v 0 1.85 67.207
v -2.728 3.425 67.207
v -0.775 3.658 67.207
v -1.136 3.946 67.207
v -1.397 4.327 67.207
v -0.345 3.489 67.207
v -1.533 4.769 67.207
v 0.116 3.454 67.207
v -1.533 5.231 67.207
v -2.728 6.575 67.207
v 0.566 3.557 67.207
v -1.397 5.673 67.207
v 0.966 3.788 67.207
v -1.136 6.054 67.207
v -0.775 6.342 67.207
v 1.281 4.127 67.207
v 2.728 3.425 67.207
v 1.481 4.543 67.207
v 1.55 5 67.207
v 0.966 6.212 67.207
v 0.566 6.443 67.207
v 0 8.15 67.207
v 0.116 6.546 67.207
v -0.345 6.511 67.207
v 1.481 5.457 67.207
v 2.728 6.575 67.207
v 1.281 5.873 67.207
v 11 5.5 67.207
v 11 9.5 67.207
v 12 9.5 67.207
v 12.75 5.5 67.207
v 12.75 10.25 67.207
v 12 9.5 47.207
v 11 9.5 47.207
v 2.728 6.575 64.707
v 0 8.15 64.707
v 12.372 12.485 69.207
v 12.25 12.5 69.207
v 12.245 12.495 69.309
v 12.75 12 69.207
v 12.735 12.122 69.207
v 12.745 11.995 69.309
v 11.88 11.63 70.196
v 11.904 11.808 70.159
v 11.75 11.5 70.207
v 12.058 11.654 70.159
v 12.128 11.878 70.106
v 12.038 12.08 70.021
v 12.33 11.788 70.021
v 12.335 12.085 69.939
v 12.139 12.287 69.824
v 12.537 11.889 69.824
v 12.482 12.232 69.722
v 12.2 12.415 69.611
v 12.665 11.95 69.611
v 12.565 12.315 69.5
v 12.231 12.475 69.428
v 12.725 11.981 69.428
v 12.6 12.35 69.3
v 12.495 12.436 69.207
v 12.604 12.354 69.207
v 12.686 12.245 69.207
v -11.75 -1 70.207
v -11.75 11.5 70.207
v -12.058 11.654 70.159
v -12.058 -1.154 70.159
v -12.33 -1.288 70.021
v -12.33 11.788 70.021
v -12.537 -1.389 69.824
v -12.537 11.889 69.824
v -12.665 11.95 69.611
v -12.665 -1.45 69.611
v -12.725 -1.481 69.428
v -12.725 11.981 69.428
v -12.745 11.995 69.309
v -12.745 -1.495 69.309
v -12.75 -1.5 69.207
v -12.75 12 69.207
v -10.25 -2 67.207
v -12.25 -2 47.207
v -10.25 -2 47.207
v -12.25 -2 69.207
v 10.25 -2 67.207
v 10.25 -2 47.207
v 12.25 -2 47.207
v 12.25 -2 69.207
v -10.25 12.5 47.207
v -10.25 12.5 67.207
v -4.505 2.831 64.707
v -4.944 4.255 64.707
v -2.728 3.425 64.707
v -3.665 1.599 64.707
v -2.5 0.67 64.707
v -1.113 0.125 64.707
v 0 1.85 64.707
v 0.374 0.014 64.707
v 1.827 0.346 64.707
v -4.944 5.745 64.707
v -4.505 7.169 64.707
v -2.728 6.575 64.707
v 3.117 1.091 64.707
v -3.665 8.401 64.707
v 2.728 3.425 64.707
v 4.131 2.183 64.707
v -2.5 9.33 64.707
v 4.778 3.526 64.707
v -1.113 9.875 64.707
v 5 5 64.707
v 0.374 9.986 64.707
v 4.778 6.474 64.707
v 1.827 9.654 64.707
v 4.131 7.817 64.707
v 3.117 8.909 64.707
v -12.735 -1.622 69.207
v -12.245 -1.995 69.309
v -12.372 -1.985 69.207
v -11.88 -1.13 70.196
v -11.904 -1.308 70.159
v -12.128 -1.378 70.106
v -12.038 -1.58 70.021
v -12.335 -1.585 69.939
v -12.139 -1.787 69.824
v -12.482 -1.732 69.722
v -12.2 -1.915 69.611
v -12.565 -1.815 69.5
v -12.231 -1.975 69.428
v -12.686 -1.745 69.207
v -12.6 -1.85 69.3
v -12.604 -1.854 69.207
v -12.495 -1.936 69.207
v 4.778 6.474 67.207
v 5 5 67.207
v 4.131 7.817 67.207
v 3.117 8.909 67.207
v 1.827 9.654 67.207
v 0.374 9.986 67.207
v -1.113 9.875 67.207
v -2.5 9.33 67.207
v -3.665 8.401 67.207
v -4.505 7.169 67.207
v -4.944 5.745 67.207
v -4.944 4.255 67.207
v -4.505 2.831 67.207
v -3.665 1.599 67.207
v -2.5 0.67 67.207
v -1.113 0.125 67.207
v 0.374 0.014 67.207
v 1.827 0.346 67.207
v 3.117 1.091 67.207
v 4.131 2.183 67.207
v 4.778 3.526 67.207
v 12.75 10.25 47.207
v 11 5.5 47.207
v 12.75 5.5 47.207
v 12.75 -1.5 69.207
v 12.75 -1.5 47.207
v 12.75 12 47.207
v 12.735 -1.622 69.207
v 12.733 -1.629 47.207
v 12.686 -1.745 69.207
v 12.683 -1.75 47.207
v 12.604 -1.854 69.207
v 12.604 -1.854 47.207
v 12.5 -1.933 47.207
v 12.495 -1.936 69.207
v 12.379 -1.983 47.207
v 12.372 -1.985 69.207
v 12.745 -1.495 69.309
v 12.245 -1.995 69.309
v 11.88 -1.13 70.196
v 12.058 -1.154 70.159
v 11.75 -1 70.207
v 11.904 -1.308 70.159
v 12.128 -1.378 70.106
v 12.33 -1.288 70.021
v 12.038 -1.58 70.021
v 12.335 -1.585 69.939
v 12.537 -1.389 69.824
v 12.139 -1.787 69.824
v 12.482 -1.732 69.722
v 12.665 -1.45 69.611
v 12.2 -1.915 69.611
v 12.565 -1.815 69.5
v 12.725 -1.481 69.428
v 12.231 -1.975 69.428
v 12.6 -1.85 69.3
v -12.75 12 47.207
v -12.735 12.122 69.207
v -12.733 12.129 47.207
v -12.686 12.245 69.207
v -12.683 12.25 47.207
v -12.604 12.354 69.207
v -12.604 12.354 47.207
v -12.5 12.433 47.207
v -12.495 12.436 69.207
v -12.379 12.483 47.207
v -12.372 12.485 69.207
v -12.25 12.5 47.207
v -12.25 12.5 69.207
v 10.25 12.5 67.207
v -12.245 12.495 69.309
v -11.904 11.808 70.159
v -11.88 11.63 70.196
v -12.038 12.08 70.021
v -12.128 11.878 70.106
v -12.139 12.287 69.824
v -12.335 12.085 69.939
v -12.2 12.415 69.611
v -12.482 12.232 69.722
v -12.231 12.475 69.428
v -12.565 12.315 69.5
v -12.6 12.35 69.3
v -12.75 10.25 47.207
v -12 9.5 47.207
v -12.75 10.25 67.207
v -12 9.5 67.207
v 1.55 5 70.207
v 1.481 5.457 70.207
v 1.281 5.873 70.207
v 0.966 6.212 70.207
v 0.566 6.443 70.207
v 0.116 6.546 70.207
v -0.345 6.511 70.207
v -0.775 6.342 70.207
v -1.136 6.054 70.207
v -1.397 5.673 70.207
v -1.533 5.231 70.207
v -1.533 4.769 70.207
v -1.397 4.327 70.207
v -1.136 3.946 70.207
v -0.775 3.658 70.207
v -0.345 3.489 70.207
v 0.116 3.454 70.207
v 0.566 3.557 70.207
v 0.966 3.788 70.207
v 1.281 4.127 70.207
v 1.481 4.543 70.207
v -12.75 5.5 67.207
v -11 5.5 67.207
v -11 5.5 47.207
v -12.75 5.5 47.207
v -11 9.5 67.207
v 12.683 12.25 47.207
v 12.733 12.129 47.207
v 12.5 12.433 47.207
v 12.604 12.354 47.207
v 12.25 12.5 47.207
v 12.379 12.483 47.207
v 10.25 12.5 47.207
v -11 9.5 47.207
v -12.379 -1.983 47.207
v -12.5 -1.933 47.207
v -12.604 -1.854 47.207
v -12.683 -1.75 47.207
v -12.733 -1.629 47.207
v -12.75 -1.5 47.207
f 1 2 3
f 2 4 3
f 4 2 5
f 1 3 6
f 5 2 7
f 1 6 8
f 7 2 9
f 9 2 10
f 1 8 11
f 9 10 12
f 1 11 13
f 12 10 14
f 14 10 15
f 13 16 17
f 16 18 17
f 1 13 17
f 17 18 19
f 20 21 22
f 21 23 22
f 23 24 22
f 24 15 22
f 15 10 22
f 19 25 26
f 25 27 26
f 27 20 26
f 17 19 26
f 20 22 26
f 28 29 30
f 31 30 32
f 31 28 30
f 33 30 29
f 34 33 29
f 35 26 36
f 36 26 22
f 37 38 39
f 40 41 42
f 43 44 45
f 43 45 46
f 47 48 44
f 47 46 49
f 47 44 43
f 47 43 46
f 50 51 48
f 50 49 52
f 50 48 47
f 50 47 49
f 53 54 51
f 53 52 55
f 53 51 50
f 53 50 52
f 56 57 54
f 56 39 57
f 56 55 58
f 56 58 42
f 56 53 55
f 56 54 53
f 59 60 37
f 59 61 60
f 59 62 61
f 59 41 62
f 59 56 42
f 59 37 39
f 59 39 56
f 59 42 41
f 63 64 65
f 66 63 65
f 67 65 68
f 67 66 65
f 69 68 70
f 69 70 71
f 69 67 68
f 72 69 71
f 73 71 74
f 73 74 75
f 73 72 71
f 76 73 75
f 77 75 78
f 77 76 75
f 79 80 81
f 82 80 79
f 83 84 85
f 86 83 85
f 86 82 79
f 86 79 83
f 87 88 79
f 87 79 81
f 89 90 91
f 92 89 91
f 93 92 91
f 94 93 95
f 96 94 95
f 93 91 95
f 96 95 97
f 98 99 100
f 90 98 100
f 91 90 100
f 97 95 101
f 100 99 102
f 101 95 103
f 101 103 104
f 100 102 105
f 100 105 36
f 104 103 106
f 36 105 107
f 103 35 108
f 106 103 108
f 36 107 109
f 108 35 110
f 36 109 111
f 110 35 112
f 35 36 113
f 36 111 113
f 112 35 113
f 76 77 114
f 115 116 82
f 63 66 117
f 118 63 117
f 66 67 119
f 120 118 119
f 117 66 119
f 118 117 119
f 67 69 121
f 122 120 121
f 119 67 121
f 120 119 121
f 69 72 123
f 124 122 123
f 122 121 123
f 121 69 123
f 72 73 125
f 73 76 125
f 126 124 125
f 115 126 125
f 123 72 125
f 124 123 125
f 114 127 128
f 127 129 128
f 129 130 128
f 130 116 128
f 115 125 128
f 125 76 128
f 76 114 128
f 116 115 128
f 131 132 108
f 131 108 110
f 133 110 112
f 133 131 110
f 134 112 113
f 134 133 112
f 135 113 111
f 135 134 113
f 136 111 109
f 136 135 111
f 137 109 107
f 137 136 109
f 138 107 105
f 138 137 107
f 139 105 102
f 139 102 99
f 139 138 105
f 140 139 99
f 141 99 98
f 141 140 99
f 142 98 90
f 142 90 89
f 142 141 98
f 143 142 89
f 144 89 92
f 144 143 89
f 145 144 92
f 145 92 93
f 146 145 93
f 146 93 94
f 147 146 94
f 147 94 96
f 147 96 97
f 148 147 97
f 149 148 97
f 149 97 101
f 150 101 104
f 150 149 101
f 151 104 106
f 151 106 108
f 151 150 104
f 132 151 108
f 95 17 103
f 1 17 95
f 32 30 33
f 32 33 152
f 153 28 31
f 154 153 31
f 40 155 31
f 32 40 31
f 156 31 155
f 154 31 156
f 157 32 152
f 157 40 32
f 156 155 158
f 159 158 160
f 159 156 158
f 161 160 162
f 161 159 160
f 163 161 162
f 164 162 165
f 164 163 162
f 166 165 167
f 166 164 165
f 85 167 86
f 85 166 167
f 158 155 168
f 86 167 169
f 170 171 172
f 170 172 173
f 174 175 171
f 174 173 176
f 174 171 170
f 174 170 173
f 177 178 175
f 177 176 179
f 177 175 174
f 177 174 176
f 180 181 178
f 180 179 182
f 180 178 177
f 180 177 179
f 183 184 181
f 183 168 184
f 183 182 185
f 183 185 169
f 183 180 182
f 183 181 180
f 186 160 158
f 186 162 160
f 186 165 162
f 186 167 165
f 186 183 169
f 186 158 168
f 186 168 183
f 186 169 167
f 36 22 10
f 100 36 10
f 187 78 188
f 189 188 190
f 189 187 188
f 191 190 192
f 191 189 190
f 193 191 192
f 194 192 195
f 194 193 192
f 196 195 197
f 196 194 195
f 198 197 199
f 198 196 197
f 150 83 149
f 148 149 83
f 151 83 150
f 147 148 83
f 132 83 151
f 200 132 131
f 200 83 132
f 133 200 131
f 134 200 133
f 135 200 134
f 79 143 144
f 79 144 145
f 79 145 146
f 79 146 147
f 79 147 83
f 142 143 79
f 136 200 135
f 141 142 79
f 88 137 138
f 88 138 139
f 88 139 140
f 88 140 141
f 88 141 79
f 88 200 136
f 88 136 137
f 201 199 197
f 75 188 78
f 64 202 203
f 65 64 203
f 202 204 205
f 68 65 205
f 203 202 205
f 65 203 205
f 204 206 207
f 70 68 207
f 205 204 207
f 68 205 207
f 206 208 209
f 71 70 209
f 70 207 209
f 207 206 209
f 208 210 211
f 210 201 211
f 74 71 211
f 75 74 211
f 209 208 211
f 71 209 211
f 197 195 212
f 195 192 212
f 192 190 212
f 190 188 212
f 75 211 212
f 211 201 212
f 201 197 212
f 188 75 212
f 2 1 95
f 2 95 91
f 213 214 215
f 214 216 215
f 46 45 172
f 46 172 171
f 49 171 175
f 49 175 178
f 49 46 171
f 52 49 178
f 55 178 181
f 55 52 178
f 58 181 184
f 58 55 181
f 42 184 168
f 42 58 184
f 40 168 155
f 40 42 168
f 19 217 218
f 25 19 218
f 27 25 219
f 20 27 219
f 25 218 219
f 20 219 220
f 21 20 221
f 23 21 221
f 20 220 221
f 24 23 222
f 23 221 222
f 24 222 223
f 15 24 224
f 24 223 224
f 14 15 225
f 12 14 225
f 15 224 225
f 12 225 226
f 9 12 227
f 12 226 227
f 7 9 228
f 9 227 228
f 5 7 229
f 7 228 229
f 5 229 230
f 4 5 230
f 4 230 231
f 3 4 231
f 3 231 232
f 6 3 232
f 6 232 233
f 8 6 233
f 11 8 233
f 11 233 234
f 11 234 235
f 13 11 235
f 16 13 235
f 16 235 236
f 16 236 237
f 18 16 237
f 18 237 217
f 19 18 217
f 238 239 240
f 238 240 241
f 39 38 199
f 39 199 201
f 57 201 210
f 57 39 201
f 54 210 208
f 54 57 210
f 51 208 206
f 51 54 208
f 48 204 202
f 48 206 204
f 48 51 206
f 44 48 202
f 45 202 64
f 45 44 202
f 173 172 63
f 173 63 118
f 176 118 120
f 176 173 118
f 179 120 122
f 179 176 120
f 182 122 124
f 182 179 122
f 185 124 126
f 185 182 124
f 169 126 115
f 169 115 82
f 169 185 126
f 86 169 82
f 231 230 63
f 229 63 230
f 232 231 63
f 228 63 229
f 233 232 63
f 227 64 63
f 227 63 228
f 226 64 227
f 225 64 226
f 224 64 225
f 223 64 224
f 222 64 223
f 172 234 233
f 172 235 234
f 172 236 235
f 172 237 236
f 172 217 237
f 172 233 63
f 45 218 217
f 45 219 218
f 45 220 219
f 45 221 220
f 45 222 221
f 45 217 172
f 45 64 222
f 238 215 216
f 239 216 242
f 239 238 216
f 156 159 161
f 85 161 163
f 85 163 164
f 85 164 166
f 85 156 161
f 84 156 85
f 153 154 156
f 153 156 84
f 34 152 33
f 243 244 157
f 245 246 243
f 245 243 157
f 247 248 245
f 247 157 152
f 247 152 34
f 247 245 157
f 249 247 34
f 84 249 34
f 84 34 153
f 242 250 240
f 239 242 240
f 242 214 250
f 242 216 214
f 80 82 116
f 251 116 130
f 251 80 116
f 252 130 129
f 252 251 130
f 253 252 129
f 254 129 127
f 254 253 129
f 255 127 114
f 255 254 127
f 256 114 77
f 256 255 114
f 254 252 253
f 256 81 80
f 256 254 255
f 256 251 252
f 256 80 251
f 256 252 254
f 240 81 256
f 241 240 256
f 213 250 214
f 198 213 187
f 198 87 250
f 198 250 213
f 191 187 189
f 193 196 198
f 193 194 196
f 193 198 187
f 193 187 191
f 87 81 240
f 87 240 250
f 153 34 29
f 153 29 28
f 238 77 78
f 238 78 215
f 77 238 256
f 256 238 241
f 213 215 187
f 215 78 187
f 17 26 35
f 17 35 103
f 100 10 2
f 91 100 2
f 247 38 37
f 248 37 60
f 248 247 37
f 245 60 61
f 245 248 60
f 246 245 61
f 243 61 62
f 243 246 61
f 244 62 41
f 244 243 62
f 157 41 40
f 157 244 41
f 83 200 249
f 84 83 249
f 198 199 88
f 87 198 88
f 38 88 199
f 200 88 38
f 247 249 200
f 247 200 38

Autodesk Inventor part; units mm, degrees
ref_plane "YZ Plane" through (0, 0, 0) normal (1, 0, 0) x (0, 1, 0)
ref_plane "XZ Plane" through (0, 0, 0) normal (0, 1, 0) x (-1, 0, 0)
ref_plane "XY Plane" through (0, 0, 0) normal (0, 0, 1) x (1, 0, 0)
sketch "Эскиз1" plane through (0, 0, 0) normal (0, 1, 0) x (-1, 0, 0)
  line L0 (0, 56.6418) -> (23.7825, 76.5969) construction
  line L1 (44.1942, 76.014) -> (76.014, 44.1942) construction
  line L2 (91.1, 52.2091) -> (52.2091, 91.1) construction
  line L3 (0, 0) -> (74.2462, 74.2462) construction
  arc A0 (92.5543, 49.5852) -> (48.7014, 93.0224) centre (0, 0) ccw construction
  line L4 (52.2091, 91.1) -> (48.6736, 87.5645) construction
  arc A1 (44.1942, 83.085) -> (44.1942, 76.014) centre (47.7297, 79.5495) ccw construction
  line L5 (52.2091, 91.1) -> (48.6736, 87.5645) construction
  line L6 (48.6736, 87.5645) -> (52.2091, 91.1) construction
  spline S0 degree 2 poles (48.6736, 87.5645) (52.2091, 91.1) (48.7014, 93.0224) knots 1 1 1 2 2 2 construction
  line L7 (52.2091, 91.1) -> (48.7014, 93.0224) construction
  line L8 (52.2091, 91.1) -> (48.7014, 93.0224) construction
  arc A2 (48.7014, 93.0224) -> (44.0271, 95.3237) centre (0, 0) ccw construction
  arc A3 (44.0271, 95.3237) -> (43.577, 95.5303) centre (0, 0) ccw construction
  line L9 (42.6652, 95.941) -> (43.577, 95.5303) construction
  line L10 (42.6652, 95.941) -> (43.577, 95.5303) construction
  spline S1 degree 2 poles (42.0492, 94.5734) (42.6652, 95.941) (43.577, 95.5303) knots 1 1 1 2 2 2 construction
  line L11 (42.0492, 94.5734) -> (42.6652, 95.941) construction
  line L12 (42.6652, 95.941) -> (42.0492, 94.5734) construction
  line L13 (0, 0) -> (0, 209.8821) construction
  spline S2 degree 2 poles (-48.6736, 87.5645) (-52.2091, 91.1) (-48.7014, 93.0224) knots 1 1 1 2 2 2 construction
  line L14 (-48.6736, 87.5645) -> (-52.2091, 91.1) construction
  line L15 (-52.2091, 91.1) -> (-48.7014, 93.0224) construction
  arc A4 (-44.1942, 76.014) -> (-44.1942, 83.085) centre (-47.7297, 79.5495) ccw construction
  line L16 (-44.1942, 76.014) -> (-76.014, 44.1942) construction
  arc A5 (-48.7014, 93.0224) -> (-92.5543, 49.5852) centre (0, 0) ccw construction
  arc A6 (-83.085, 44.1942) -> (-76.014, 44.1942) centre (-79.5495, 47.7297) ccw construction
  line L17 (-83.085, 44.1942) -> (-87.3563, 48.4654) construction
  spline S3 degree 2 poles (-48.6736, -87.5645) (-52.2091, -91.1) (-48.7014, -93.0224) knots 1 1 1 2 2 2 construction
  line L18 (-48.6736, -87.5645) -> (-52.2091, -91.1) construction
  line L19 (-52.2091, -91.1) -> (-48.7014, -93.0224) construction
  circle A7 centre (0, 0) radius 35 construction
  line L20 (-46.3155, -73.8927) -> (-73.8927, -46.3155) construction
  arc A8 (-73.8927, -46.3155) -> (-85.2064, -46.3155) centre (-79.5495, -51.9723) ccw construction
  line L21 (-85.2064, -46.3155) -> (-87.5645, -48.6736) construction
  line L22 (-87.5645, -48.6736) -> (-91.1, -52.2091) construction
  spline S4 degree 2 poles (-87.5645, -48.6736) (-91.1, -52.2091) (-92.5543, -49.5852) knots 1 1 1 2 2 2 construction
  line L23 (-91.1, -52.2091) -> (-92.5543, -49.5852) construction
  arc A9 (-92.5543, -49.5852) -> (-48.7014, -93.0224) centre (0, 0) ccw construction
  arc A10 (-92.5543, 49.5852) -> (-92.5543, -49.5852) centre (0, 0) ccw construction
  line L24 (48.6736, -87.5645) -> (46.3155, -85.2064) construction
  arc A11 (-46.3155, -85.2064) -> (-46.3155, -73.8927) centre (-51.9723, -79.5495) ccw construction
  line L25 (-48.6736, -87.5645) -> (-46.3155, -85.2064) construction
  arc A12 (-48.7014, -93.0224) -> (48.7014, -93.0224) centre (0, 0) ccw construction
  arc A13 (46.3155, -73.8927) -> (46.3155, -85.2064) centre (51.9723, -79.5495) ccw construction
  arc A14 (43.577, 95.5303) -> (-43.577, 95.5303) centre (0, 0) ccw construction
  arc A15 (23.7825, 76.5969) -> (0, 67.941) centre (0, 104.941) ccw construction
  line L26 (0, 56.6418) -> (-35.5516, 86.4744) construction
  line L27 (44.0271, 95.3237) -> (44.0271, 127.8162) construction
  ellipse E0 centre (0, 102.7511) end of major axis (44.0271, 102.7511) minor radius 27.5932 (42.0492, 94.5734) -> (35.2734, 86.2384) ccw construction
  line L28 (42.6652, 95.941) -> (-42.6652, 95.941) construction
  ellipse E1 centre (0, 102.7511) end of major axis (44.5159, 105.2445) minor radius 28.887 (35.2734, 86.2384) -> (42.0492, 94.5734) ccw construction
  line L29 (23.7825, 76.5969) -> (35.2734, 86.2384) construction
  arc A16 (0, 67.941) -> (23.7825, 76.5969) centre (0, 104.941) ccw construction
  arc A17 (-23.7825, 76.5969) -> (0, 67.941) centre (0, 104.941) ccw construction
  line L30 (-23.7825, 76.5969) -> (-35.2734, 86.2384) construction
  line L31 (-42.6652, 95.941) -> (-42.0492, 94.5734) construction
  arc A18 (-43.577, 95.5303) -> (-48.7014, 93.0224) centre (0, 0) ccw construction
  line L32 (-42.6652, 95.941) -> (-43.577, 95.5303) construction
  spline S5 degree 2 poles (-42.0492, 94.5734) (-42.6652, 95.941) (-43.577, 95.5303) knots 1 1 1 2 2 2 construction
  line L33 (-42.0492, 94.5734) -> (-42.6652, 95.941) construction
  line L34 (-42.6652, 95.941) -> (-43.577, 95.5303) construction
  line L35 (-42.6652, 95.941) -> (-43.577, 95.5303) construction
  spline S6 degree 2 poles (-42.0492, 94.5734) (-42.6652, 95.941) (-43.577, 95.5303) knots 1 1 1 2 2 2 construction
  line L36 (-42.0492, 94.5734) -> (-42.6652, 95.941) construction
  ellipse E2 centre (0, 102.7511) end of major axis (-44.5159, 105.2445) minor radius 28.887 (-42.0492, 94.5734) -> (-35.2734, 86.2384) ccw construction
  line L37 (83.085, 44.1942) -> (87.5645, 48.6736) construction
  arc A19 (76.014, 44.1942) -> (83.085, 44.1942) centre (79.5495, 47.7297) ccw construction
  spline S7 degree 2 poles (48.6736, -87.5645) (52.2091, -91.1) (48.7014, -93.0224) knots 1 1 1 2 2 2 construction
  line L38 (48.6736, -87.5645) -> (52.2091, -91.1) construction
  line L39 (52.2091, -91.1) -> (48.7014, -93.0224) construction
  line L40 (46.3155, -73.8927) -> (73.8927, -46.3155) construction
  arc A20 (85.2064, -46.3155) -> (73.8927, -46.3155) centre (79.5495, -51.9723) ccw construction
  line L41 (85.2064, -46.3155) -> (87.5645, -48.6736) construction
  spline S8 degree 2 poles (87.5645, -48.6736) (91.1, -52.2091) (92.5543, -49.5852) knots 1 1 1 2 2 2 construction
  line L42 (87.5645, -48.6736) -> (91.1, -52.2091) construction
  line L43 (91.1, -52.2091) -> (92.5543, -49.5852) construction
  arc A21 (92.5543, -49.5852) -> (92.5543, 49.5852) centre (0, 0) ccw construction
  arc A22 (48.7014, -93.0224) -> (92.5543, -49.5852) centre (0, 0) ccw construction
  arc A23 (28.5452, 71.4571) -> (-28.5452, 71.4571) centre (0, 104.941) ccw construction
  line L44 (-83.085, 34.2947) -> (-90.6891, 41.8987) construction
  line L45 (-93.5297, 47.6709) -> (-92.5543, 49.5852) construction
  line L46 (-29.1816, 81.127) -> (-76.014, 34.2947) construction
  arc A24 (-83.085, 34.2947) -> (-76.014, 34.2947) centre (-79.5495, 37.8302) ccw construction
  line L47 (-34.1491, 76.1596) -> (-28.5452, 71.4571) construction
  arc A25 (-30.6393, 73.2144) -> (-37.3889, 72.9198) centre (-33.8534, 69.3842) ccw construction
  arc A26 (-90.6891, 41.8987) -> (-87.3563, 48.4654) centre (0, 0) ccw construction
  arc A27 (37.3889, 72.9198) -> (30.6393, 73.2144) centre (33.8534, 69.3842) ccw construction
  line L48 (29.1816, 81.127) -> (76.014, 34.2947) construction
  arc A28 (76.014, 34.2947) -> (83.085, 34.2947) centre (79.5495, 37.8302) ccw construction
  line L49 (83.085, 34.2947) -> (90.6891, 41.8987) construction
  arc A29 (76.014, 44.1942) -> (83.085, 44.1942) centre (79.5495, 47.7297) ccw construction
  line L50 (44.1942, 76.014) -> (76.014, 44.1942) construction
  arc A30 (44.1942, 83.085) -> (44.1942, 76.014) centre (47.7297, 79.5495) ccw construction
  arc A31 (5.5413, 61.2914) -> (28.5452, 71.4571) centre (0, 104.941) ccw
  arc A32 (-28.5452, 71.4571) -> (5.5413, 61.2914) centre (0, 104.941) ccw
  line L51 (34.1491, 76.1596) -> (28.5452, 71.4571) construction
  arc A33 (-87.3563, 48.4654) -> (-90.6891, 41.8987) centre (0, 0) ccw construction
  line L52 (83.085, 44.1942) -> (87.3563, 48.4654) construction
  arc A34 (90.6891, 41.8987) -> (87.3563, 48.4654) centre (0, 0) ccw construction
  line L53 (-44.1942, 83.085) -> (-48.6736, 87.5645) construction
  line L54 (44.0271, 95.3237) -> (43.577, 95.5303) construction
  line L55 (48.6736, 87.5645) -> (44.1942, 83.085) construction
  line L56 (0, 104.941) -> (-23.6028, 54.3247) construction
  circle A35 centre (31.1916, 76.2887) radius 2 construction
  line L57 (29.1816, 81.127) -> (23.7825, 76.5969)
  line L58 (29.1816, 81.127) -> (34.1491, 76.1596)
  line L59 (34.1491, 76.1596) -> (28.5452, 71.4571)
  line L60 (-28.5452, 71.4571) -> (-34.1491, 76.1596)
  line L61 (-23.7825, 76.5969) -> (-29.1816, 81.127)
  line L62 (-29.1816, 81.127) -> (-34.1491, 76.1596)
  arc A36 (-26.6462, 78.9996) -> (-31.2232, 73.7044) centre (-28.9734, 76.3855) ccw
  arc A37 (31.2232, 73.7044) -> (26.6462, 78.9996) centre (28.9734, 76.3855) ccw
  line L63 (12.75, 58.0269) -> (-12.75, 58.0269)
  line L64 (0, 67.941) -> (0, 64.941) construction
  line L65 (-12.75, 58.0269) -> (-12.75, 67.2072) construction
  line L66 (12.75, 58.0269) -> (12.75, 67.2072) construction
  arc A38 (-12.75, 67.2072) -> (12.75, 67.2072) centre (0, 101.941) ccw
  line L67 (12.75, 67.2072) -> (12.75, 70.2072)
  line L68 (-12.75, 70.2072) -> (-12.75, 70.2072) construction
  line L69 (-12.75, 67.2072) -> (-12.75, 70.2072)
  line L70 (10.1, 59.4125) -> (-10.1, 59.4125) construction
  line L71 (12.75, 70.2072) -> (-12.75, 70.2072)
  line L72 (12.75, 67.2072) -> (-12.75, 67.2072)
  point P0 (60.1041, 60.1041)
  point P1 (40.6586, 79.5495)
  point P2 (79.5495, 40.6586)
  point P3 (0, 105)
  point P4 (-87.5645, 48.6736)
  point P5 (-23.542, 76.3968)
  point P6 (-34.9935, 86.0061)
  point P7 (0, 95.941)
  point P8 (-94.5192, 45.7288)
  point P9 (-13.2817, 58.6489)
  point P10 (-28.5452, 71.4571)
  point P11 (13.2817, 58.6489)
  point P12 (-15.6369, 71.4076)
  point P13 (-26.8032, 79.1314)
  point P14 (-31.2232, 73.7044)
  point P15 (26.8032, 79.1314)
  dimension "d67" = 44.5856
  dimension "d48" = 74
  dimension "d49" = 100
  dimension "d50" = 28
  dimension "d51" = 15
  dimension "d52" = 45
  dimension "d53" = 55
  dimension "d54" = 16.3348
  dimension "d55" = 27.5
  dimension "d56" = 5
  dimension "d57" = 5
  dimension "d58" = 1
  dimension "d59" = 1.5
  dimension "d60" = 1.5
  dimension "d61" = 1
  dimension "d62" = 4
  dimension "d63" = 70
  dimension "d64" = 85
  dimension "d65" = 105
  dimension "d66" = 1.3619
  dimension "d68" = 88
  dimension "d69" = 7
  dimension "d70" = 5
  dimension "d71" = 7
  dimension "d72" = 5
  dimension "d73" = 7
  dimension "d74" = 5
  dimension "d75" = 5.1
  dimension "d78" = 4
  dimension "d166" = 25.5
  dimension "d169" = 3
  dimension "d171" = 3
  dimension "d172" = 3
  dimension "d173" = 20.2
extrude "Выдавливание7" add sketch "Эскиз1" along normal blind 14 contours L69 L71 L67 L72
sketch "Эскиз10" plane through (12.75, 0, 67.2072) normal (0, 0, -1) x (-1, 0, 0)
  line L0 (25.5, 0) -> (0, 0) construction
  line L1 (0, 0) -> (0, 14) construction
  line L2 (25.5, 14) -> (0, 14) construction
  line L3 (25.5, 0) -> (25.5, 14) construction
  line L4 (25.5, 14) -> (0, 14) construction
  line L5 (12.75, 14) -> (12.75, 0) construction
  line L6 (-0.25, 15.8948) -> (-0.25, -2.2577) construction
  line L7 (0, 14) -> (2.5, 14)
  line L8 (2.5, 14) -> (2.5, 0)
  line L9 (2.5, 0) -> (0, 0)
  line L10 (0, 0) -> (0, 14)
  line L11 (0, 9) -> (2.5, 9) construction
  line L12 (0, 0) -> (0, 14) construction
  line L13 (0, 9.5) -> (1.75, 9.5)
  line L14 (1.75, 9.5) -> (1.75, 5.5)
  line L15 (1.75, 5.5) -> (0, 5.5)
  line L16 (0, 5.5) -> (0, 9.5) construction
  line L17 (0, 9) -> (1.25, 9) construction
  line L18 (1.25, 9) -> (1.25, 6) construction
  line L19 (1.25, 6) -> (0, 6) construction
  line L20 (0, 6) -> (0, 9) construction
  line L21 (1.25, 9) -> (0, 10.25)
  line L22 (25.5, 0) -> (25.5, 14) construction
  line L23 (25.5, 14) -> (23, 14)
  line L24 (23, 14) -> (23, 0)
  line L25 (23, 0) -> (25.5, 0)
  line L26 (25.5, 0) -> (25.5, 14)
  line L27 (25.5, 9) -> (23, 9) construction
  line L28 (25.5, 0) -> (25.5, 14) construction
  line L29 (25.5, 9.5) -> (23.75, 9.5)
  line L30 (23.75, 9.5) -> (23.75, 5.5)
  line L31 (23.75, 5.5) -> (25.5, 5.5)
  line L32 (25.5, 5.5) -> (25.5, 9.5) construction
  line L33 (25.5, 9) -> (24.25, 9) construction
  line L34 (24.25, 9) -> (24.25, 6) construction
  line L35 (24.25, 6) -> (25.5, 6) construction
  line L36 (25.5, 6) -> (25.5, 9) construction
  line L37 (24.25, 9) -> (25.5, 10.25)
  point P0 (24.75, 9.5)
  point P1 (0, 5.5)
  point P2 (0, 10.25)
  point P3 (0.75, 9.5)
  dimension "d215" = 26
  dimension "d216" = 20.5
  dimension "d218" = 3
  dimension "d219" = 1.5
  dimension "d220" = 0.5
  dimension "d221" = 0.5
  dimension "d222" = 0.5
  dimension "d223" = 135
  dimension "d237" = 5.5
extrude "Выдавливание16" add sketch "Эскиз10" along normal blind 20 contours L7 L8 L9 L10 L15 L14 L13 L21 | L26 L37 L29 L30 L31 L25 L24 L23
sketch "Эскиз12" plane through (-12.75, 0, 70.2072) normal (0, 0, 1) x (1, 0, 0)
  line L0 (0, 14) -> (2.5, 14) construction
  line L1 (2.5, 14) -> (2.5, 0) construction
  line L2 (2.5, 0) -> (0, 0) construction
  line L3 (0, 0) -> (0, 5.5) construction
  line L4 (0, 5.5) -> (1.75, 5.5) construction
  line L5 (1.75, 5.5) -> (1.75, 9.5) construction
  line L6 (1.75, 9.5) -> (0.75, 9.5) construction
  line L7 (0.75, 9.5) -> (0, 10.25) construction
  line L8 (0, 10.25) -> (0, 14) construction
  line L9 (0, 0) -> (25.5, 0) construction
  line L10 (25.5, 0) -> (25.5, 14) construction
  line L11 (0, 14) -> (25.5, 14) construction
  line L12 (0, 0) -> (0, 14) construction
  line L13 (25.5, 14) -> (25.5, 10.25) construction
  line L14 (25.5, 10.25) -> (24.75, 9.5) construction
  line L15 (24.75, 9.5) -> (23.75, 9.5) construction
  line L16 (23.75, 9.5) -> (23.75, 5.5) construction
  line L17 (23.75, 5.5) -> (25.5, 5.5) construction
  line L18 (25.5, 5.5) -> (25.5, 0) construction
  line L19 (25.5, 0) -> (23, 0) construction
  line L20 (23, 0) -> (23, 14) construction
  line L21 (23, 14) -> (25.5, 14) construction
  line L22 (23, 0) -> (23, 14) construction
  line L23 (0, 14) -> (25.5, 14) construction
  line L24 (23, 14) -> (25.5, 14) construction
  line L25 (23, 14) -> (2.5, 14) construction
  line L26 (0, 14) -> (2.5, 14) construction
  line L27 (25.5, 0) -> (25.5, 14) construction
  line L28 (25.5, 5.5) -> (25.5, 10.25) construction
  line L29 (0, 0) -> (0, 14) construction
  line L30 (0, 14) -> (25.5, 14) construction
  line L31 (12.75, 14) -> (12.75, 0) construction
  circle A0 centre (12.75, 5) radius 3.15
  circle A1 centre (12.75, 5) radius 1.55
  line L32 (12.75, 5) -> (15.478, 6.575) construction
  line L33 (12.75, 5) -> (10.022, 6.575) construction
  line L34 (12.75, 5) -> (15.9, 5) construction
  line L35 (12.75, 5) -> (15.478, 3.425) construction
  line L36 (12.75, 5) -> (10.022, 3.425) construction
  line L37 (15.478, 6.575) -> (12.75, 8.15)
  line L38 (12.75, 8.15) -> (10.022, 6.575)
  line L39 (10.022, 6.575) -> (10.022, 3.425)
  line L40 (15.478, 6.575) -> (15.478, 3.425)
  line L41 (15.478, 3.425) -> (12.75, 1.85)
  line L42 (12.75, 1.85) -> (10.022, 3.425)
  circle A2 centre (12.75, 5) radius 5
  point P0 (15.478, 3.425)
  point P1 (15.478, 3.425)
  point P2 (12.75, 1.85)
  point P3 (10.022, 3.425)
  point P4 (10.022, 3.425)
  point P5 (10.022, 6.575)
  point P6 (10.022, 6.575)
  dimension "d226" = 6.3
  dimension "d229" = 3.1
  dimension "d238" = 5
  dimension "d239" = 60
  dimension "d244" = 10
extrude "Выдавливание17" [suppressed]
extrude "Выдавливание18" cut sketch "Эскиз12" against normal blind 5.5 contours A1
extrude "Выдавливание19" cut sketch "Эскиз12" against normal blind 5.5 contours L40 L41 L42 L39 L38 L37
fillet "Сопряжение1" [suppressed]
sketch "Эскиз14" plane through (0, 0, 0) normal (0, -1, 0) x (1, 0, 0)
  line L0 (-12.75, 70.2072) -> (12.75, 70.2072) projected
  line L1 (-12.75, 70.2072) -> (-12.75, 47.2072) projected
  line L2 (-10.25, 47.2072) -> (-12.75, 47.2072) projected
  line L3 (-10.25, 67.2072) -> (-10.25, 47.2072) projected
  line L4 (10.25, 67.2072) -> (-10.25, 67.2072) projected
  line L5 (10.25, 67.2072) -> (10.25, 47.2072) projected
  line L6 (12.75, 47.2072) -> (10.25, 47.2072) projected
  line L7 (12.75, 70.2072) -> (12.75, 47.2072) projected
  point P0 (0, 0)
extrude "Выдавливание20" add sketch "Эскиз14" along normal blind 2
fillet "Сопряжение2" [suppressed]
extrude "Выдавливание21" add sketch "Эскиз12" against normal blind 5.5 contours A2
extrude "Выдавливание22" add sketch "Эскиз12" against normal blind 3 contours L40 L41 L42 L39 L38 L37
extrude "Выдавливание23" add sketch "Эскиз12" against normal blind 5.5 contours A0 L40 | L37 A0 | A0 L41 | L38 A0 | A0 L42 | L39 A0
sketch "Эскиз16" plane through (0, 14, 0) normal (0, 1, 0) x (1, 0, 0)
  line L0 (-12.75, -70.2072) -> (12.75, -70.2072) projected
  line L1 (12.75, -70.2072) -> (12.75, -47.2072) projected
  line L2 (10.25, -47.2072) -> (12.75, -47.2072) projected
  line L3 (10.25, -67.2072) -> (10.25, -47.2072) projected
  line L4 (10.25, -67.2072) -> (-10.25, -67.2072) projected
  line L5 (-10.25, -67.2072) -> (-10.25, -47.2072) projected
  line L6 (-12.75, -47.2072) -> (-10.25, -47.2072) projected
  line L7 (-12.75, -70.2072) -> (-12.75, -47.2072) projected
  point P0 (0, 0)
extrude "Выдавливание24" cut sketch "Эскиз16" against normal blind 1.5
fillet "Сопряжение3" radius 1 4 edges at (0, 12.5, 70.2072) (12.75, 5.25, 70.2072) (0, -2, 70.2072) (-12.75, 5.25, 70.2072)
fillet "Сопряжение4" radius 0.5 6 edges at (-12.4571, 12.2071, 69.9143) (-12.4571, -1.7071, 69.9143) (-12.75, -2, 58.2072) (12.4571, -1.7071, 69.9143) (12.75, -2, 58.2072) (12.4571, 12.2071, 69.9143)
properties part number "_3DПЕЧАТЬ"
